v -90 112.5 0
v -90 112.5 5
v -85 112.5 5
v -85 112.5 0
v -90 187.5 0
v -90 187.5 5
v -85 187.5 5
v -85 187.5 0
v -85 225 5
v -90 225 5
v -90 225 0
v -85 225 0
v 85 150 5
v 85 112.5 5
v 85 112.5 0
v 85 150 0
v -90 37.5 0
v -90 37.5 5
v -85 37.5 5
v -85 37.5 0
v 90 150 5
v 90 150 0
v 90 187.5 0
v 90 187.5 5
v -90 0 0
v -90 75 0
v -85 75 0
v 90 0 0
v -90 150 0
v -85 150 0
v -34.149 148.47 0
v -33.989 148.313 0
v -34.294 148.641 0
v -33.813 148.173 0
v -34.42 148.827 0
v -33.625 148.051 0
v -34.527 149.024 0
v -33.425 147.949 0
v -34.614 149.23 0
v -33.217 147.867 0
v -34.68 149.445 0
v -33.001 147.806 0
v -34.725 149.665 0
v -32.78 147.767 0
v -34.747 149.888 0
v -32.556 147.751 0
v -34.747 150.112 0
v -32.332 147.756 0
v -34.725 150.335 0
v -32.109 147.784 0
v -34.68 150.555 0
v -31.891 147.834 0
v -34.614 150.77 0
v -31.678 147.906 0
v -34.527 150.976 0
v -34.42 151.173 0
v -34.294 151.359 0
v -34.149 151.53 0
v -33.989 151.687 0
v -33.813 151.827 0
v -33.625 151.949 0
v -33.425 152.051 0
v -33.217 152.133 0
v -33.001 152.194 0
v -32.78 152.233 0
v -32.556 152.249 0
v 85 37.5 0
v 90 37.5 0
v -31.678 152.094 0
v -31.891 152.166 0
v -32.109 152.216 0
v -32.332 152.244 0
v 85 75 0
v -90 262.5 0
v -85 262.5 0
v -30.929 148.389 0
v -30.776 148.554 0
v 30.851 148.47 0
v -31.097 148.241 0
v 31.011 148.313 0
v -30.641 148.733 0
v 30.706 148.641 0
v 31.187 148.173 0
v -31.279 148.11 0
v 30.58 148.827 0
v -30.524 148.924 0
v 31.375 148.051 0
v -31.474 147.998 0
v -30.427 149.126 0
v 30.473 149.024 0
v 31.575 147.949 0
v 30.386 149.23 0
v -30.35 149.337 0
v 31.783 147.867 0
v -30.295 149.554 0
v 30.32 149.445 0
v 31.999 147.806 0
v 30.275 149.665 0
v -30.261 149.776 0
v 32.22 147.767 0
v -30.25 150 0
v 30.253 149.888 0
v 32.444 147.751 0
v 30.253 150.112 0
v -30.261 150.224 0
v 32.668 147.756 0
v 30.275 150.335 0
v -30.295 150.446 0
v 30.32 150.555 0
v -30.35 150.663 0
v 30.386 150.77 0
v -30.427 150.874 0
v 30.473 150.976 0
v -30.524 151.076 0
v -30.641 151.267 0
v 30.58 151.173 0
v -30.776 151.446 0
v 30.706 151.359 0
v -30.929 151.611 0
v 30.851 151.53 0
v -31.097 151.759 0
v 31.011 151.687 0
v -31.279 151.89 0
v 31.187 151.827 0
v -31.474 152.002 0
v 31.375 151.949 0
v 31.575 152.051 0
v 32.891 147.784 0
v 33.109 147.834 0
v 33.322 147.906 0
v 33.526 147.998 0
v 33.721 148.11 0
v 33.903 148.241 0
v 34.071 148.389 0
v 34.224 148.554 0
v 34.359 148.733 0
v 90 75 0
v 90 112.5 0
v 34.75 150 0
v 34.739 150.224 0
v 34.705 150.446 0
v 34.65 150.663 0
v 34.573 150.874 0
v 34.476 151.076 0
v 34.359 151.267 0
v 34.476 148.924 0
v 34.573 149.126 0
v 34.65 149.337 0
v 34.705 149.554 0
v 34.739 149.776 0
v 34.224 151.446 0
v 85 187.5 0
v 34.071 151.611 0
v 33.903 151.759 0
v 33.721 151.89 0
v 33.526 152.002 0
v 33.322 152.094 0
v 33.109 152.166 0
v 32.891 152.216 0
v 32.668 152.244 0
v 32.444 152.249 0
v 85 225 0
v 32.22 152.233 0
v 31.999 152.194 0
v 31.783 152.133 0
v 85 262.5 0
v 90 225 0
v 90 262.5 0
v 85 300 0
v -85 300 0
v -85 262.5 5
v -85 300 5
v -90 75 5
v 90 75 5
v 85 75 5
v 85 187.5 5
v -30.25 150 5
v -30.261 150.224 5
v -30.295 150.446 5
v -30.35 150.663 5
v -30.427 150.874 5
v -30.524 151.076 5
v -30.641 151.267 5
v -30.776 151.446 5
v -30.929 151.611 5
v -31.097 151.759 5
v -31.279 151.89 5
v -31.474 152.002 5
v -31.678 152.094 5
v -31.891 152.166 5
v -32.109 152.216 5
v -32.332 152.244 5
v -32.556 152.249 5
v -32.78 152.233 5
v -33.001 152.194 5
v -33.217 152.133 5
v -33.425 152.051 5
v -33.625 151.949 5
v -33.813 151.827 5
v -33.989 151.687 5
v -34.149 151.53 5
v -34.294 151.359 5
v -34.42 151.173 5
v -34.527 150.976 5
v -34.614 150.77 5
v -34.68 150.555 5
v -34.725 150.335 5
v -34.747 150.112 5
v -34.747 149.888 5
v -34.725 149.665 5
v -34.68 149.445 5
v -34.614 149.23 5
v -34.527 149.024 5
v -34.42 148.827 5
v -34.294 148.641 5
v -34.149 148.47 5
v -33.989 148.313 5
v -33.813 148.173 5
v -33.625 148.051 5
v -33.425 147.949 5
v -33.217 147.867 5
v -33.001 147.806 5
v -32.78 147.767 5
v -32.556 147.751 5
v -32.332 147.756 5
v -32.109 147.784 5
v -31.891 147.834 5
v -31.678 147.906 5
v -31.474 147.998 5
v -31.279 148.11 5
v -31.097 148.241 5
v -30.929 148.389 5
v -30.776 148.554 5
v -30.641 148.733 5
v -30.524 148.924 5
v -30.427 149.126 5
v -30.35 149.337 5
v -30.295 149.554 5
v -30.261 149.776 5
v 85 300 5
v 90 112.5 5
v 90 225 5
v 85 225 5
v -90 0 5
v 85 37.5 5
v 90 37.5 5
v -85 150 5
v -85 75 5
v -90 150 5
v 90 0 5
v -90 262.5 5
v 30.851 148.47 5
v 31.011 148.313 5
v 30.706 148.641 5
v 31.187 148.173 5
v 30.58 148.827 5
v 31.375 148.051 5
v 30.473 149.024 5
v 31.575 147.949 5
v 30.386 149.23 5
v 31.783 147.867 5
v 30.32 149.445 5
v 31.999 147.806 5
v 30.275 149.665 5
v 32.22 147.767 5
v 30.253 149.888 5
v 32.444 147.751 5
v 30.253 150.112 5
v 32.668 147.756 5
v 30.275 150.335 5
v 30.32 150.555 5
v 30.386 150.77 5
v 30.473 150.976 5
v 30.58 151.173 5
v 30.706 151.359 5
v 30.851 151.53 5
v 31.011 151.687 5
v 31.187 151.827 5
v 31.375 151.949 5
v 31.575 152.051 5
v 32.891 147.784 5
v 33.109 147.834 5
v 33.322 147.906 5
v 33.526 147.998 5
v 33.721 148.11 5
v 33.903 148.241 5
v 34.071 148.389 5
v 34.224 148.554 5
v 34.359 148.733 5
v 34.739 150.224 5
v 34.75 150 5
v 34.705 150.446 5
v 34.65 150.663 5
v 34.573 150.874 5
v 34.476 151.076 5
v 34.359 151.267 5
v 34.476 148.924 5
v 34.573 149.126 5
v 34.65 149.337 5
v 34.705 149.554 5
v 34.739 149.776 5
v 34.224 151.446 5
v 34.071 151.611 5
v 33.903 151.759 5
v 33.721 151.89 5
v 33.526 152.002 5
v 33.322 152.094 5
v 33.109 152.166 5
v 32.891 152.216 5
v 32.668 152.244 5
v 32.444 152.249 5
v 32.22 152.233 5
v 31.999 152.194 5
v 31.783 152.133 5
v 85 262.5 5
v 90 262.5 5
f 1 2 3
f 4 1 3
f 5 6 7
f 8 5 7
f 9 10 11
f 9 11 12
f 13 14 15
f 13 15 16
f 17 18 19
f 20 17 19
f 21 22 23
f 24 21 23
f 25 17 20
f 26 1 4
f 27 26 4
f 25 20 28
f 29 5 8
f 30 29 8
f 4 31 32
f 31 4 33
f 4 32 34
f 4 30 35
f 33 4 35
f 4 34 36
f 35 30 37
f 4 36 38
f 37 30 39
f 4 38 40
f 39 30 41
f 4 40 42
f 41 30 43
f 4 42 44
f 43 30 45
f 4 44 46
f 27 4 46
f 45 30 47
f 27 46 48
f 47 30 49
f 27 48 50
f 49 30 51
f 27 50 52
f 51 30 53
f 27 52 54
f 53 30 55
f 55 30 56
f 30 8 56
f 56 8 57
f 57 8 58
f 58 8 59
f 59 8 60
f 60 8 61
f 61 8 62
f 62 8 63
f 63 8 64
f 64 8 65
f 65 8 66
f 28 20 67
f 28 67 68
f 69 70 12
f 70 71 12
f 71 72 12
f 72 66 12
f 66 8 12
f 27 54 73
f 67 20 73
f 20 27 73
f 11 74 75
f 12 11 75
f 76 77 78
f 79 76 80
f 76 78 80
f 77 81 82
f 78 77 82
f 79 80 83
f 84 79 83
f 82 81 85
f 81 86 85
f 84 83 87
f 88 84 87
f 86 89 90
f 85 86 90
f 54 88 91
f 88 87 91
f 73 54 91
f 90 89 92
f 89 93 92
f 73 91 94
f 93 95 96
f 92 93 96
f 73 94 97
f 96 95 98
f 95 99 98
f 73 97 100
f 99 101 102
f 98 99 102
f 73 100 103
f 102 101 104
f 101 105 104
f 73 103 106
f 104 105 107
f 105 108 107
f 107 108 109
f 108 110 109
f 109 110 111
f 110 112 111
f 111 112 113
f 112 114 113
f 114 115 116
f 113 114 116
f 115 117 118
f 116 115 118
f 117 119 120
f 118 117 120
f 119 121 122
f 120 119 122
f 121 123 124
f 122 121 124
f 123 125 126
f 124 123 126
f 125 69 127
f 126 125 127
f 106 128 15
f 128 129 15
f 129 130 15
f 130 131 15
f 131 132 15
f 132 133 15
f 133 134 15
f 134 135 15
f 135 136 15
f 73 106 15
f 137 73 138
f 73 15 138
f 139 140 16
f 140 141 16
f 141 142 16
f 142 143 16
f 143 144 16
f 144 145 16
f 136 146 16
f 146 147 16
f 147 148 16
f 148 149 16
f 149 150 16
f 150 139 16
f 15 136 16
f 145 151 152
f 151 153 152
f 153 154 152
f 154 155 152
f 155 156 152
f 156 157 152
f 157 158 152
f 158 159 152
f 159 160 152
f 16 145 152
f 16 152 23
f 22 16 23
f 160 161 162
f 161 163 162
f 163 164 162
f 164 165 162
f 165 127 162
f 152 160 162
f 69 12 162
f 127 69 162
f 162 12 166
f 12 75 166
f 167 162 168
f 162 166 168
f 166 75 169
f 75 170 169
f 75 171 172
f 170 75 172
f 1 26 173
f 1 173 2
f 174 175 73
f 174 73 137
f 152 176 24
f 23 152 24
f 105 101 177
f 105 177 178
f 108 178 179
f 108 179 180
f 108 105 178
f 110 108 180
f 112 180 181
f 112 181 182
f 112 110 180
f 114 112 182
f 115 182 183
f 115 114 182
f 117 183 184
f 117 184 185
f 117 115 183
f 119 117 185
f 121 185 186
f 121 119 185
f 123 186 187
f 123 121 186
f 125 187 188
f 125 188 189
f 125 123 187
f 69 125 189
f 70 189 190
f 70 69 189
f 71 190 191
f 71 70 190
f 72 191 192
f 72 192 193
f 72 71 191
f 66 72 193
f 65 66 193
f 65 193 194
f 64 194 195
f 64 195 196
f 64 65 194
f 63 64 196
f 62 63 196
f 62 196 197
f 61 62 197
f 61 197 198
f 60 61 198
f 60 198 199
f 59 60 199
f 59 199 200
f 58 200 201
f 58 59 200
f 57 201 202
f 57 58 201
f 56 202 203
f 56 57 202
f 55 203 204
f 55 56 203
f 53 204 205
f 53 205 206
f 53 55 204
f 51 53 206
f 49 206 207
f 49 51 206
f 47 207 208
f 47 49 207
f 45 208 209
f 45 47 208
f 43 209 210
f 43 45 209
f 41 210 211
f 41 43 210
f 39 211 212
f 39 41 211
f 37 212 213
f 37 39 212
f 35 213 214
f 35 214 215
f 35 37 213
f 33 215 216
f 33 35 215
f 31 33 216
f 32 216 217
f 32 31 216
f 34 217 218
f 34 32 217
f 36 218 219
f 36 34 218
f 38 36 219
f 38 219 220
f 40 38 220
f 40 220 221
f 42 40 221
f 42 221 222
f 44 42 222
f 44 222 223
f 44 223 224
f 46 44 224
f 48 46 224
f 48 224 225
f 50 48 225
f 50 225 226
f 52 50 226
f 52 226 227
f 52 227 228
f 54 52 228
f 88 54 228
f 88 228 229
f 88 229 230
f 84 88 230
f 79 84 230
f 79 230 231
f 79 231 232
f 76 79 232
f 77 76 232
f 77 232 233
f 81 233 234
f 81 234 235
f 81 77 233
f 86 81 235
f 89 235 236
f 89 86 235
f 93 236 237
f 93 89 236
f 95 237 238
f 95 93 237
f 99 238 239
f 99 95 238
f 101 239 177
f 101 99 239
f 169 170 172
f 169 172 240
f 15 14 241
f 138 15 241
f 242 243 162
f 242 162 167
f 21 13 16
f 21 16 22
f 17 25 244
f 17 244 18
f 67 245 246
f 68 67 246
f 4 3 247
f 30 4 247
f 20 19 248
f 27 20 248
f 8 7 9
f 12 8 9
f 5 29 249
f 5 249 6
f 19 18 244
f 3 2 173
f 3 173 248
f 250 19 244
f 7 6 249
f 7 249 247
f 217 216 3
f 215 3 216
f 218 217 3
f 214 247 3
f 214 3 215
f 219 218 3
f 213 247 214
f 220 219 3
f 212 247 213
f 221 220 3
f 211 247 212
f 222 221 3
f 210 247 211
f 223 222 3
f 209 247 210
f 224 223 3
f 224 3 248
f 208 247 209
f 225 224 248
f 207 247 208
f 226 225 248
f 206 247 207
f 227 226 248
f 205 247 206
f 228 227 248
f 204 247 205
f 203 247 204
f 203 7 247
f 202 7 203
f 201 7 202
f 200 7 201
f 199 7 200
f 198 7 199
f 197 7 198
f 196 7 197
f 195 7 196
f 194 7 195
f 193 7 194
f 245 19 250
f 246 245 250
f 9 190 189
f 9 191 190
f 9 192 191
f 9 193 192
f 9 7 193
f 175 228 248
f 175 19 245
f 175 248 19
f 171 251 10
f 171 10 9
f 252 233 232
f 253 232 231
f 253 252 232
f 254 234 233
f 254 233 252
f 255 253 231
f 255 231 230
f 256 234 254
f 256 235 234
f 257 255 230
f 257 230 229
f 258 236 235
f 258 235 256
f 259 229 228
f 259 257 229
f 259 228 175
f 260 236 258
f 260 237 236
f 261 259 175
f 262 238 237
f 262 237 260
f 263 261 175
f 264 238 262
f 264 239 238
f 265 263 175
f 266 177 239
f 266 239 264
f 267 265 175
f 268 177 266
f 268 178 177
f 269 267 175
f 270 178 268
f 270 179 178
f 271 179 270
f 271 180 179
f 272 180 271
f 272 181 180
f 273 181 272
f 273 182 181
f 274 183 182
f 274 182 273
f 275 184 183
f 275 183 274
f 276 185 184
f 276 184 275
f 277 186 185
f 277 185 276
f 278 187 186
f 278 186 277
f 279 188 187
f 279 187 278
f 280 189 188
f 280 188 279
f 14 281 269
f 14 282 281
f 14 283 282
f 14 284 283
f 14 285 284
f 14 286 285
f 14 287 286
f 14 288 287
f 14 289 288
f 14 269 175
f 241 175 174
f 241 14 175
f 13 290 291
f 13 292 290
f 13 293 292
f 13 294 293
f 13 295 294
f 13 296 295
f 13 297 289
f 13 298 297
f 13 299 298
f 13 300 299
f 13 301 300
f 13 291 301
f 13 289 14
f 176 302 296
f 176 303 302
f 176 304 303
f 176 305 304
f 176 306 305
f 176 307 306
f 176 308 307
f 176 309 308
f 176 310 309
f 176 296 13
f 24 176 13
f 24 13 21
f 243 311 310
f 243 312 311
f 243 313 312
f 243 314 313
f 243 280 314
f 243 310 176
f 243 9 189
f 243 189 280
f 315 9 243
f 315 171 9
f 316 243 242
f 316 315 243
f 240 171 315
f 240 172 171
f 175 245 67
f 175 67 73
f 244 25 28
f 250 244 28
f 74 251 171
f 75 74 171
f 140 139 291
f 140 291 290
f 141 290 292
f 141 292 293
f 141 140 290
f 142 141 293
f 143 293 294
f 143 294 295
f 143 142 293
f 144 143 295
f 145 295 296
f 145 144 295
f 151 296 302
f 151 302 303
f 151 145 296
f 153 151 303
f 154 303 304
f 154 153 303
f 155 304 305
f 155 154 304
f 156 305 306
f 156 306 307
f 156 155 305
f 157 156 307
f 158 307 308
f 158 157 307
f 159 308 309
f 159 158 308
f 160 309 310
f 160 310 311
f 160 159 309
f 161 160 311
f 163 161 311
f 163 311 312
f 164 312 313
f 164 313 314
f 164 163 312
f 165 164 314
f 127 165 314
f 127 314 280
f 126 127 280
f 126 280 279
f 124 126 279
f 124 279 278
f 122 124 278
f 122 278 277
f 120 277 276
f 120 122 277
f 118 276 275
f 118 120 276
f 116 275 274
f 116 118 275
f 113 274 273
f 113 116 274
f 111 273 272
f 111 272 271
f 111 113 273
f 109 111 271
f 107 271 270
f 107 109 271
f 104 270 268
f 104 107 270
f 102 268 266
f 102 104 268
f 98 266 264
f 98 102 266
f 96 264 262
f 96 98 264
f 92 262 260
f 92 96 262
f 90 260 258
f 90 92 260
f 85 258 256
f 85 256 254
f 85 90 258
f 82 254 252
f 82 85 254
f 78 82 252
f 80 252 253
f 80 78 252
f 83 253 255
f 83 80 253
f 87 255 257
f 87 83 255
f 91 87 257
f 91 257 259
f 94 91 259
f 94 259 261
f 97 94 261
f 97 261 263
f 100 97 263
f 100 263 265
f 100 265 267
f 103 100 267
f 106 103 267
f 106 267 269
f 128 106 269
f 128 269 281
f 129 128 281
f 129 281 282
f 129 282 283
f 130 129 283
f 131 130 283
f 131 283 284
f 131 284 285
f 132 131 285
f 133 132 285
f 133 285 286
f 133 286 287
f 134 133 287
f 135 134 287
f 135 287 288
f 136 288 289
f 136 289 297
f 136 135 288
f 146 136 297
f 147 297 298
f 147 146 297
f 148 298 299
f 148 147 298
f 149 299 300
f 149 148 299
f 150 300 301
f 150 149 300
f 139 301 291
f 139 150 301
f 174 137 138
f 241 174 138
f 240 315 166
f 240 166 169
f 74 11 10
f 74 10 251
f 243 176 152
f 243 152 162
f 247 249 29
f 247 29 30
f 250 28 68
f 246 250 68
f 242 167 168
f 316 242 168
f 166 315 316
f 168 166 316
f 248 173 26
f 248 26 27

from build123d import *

# Parameters (mm, degrees)
SKETCH1_W           = 180
SKETCH1_H           = 300
SKETCH1_R           = 2.25
BOSS_EXTRUDE1_DEPTH = 5
CUT_EXTRUDE1_REACH  = 315.249
SKETCH2_W           = 5
SKETCH2_H           = 37.5


with BuildPart() as part:
    # Sketch1 → Boss-Extrude1 (new body)
    with BuildSketch(Plane.XY):
        with Locations((0, 150)):
            Rectangle(SKETCH1_W, SKETCH1_H)
        with Locations((-32.5, 150)):
            Circle(SKETCH1_R, mode=Mode.SUBTRACT)
        with Locations((32.5, 150)):
            Circle(SKETCH1_R, mode=Mode.SUBTRACT)
    extrude(amount=BOSS_EXTRUDE1_DEPTH)

    # Sketch2 → Cut-Extrude1 (cut, up to next)
    with BuildSketch(Plane.XY.offset(5), mode=Mode.PRIVATE) as cut_extrude1_sk1:
        with Locations((-87.5, 281.25)):
            Rectangle(SKETCH2_W, SKETCH2_H)
    cut_extrude1_tool1 = extrude(cut_extrude1_sk1.sketch, amount=-CUT_EXTRUDE1_REACH, mode=Mode.PRIVATE) & part.part
    # Sketch2 → Cut-Extrude1 (cut, up to next)
    with BuildSketch(Plane.XY.offset(5), mode=Mode.PRIVATE) as cut_extrude1_sk2:
        with Locations((-87.5, 206.25)):
            Rectangle(SKETCH2_W, SKETCH2_H)
    cut_extrude1_tool2 = extrude(cut_extrude1_sk2.sketch, amount=-CUT_EXTRUDE1_REACH, mode=Mode.PRIVATE) & part.part
    # Sketch2 → Cut-Extrude1 (cut, up to next)
    with BuildSketch(Plane.XY.offset(5), mode=Mode.PRIVATE) as cut_extrude1_sk3:
        with Locations((-87.5, 131.25)):
            Rectangle(SKETCH2_W, SKETCH2_H)
    cut_extrude1_tool3 = extrude(cut_extrude1_sk3.sketch, amount=-CUT_EXTRUDE1_REACH, mode=Mode.PRIVATE) & part.part
    # Sketch2 → Cut-Extrude1 (cut, up to next)
    with BuildSketch(Plane.XY.offset(5), mode=Mode.PRIVATE) as cut_extrude1_sk4:
        with Locations((-87.5, 56.25)):
            Rectangle(SKETCH2_W, SKETCH2_H)
    cut_extrude1_tool4 = extrude(cut_extrude1_sk4.sketch, amount=-CUT_EXTRUDE1_REACH, mode=Mode.PRIVATE) & part.part
    # Sketch2 → Cut-Extrude1 (cut, up to next)
    with BuildSketch(Plane.XY.offset(5), mode=Mode.PRIVATE) as cut_extrude1_sk5:
        with Locations((87.5, 281.25)):
            Rectangle(SKETCH2_W, SKETCH2_H)
    cut_extrude1_tool5 = extrude(cut_extrude1_sk5.sketch, amount=-CUT_EXTRUDE1_REACH, mode=Mode.PRIVATE) & part.part
    # Sketch2 → Cut-Extrude1 (cut, up to next)
    with BuildSketch(Plane.XY.offset(5), mode=Mode.PRIVATE) as cut_extrude1_sk6:
        with Locations((87.5, 206.25)):
            Rectangle(SKETCH2_W, SKETCH2_H)
    cut_extrude1_tool6 = extrude(cut_extrude1_sk6.sketch, amount=-CUT_EXTRUDE1_REACH, mode=Mode.PRIVATE) & part.part
    # Sketch2 → Cut-Extrude1 (cut, up to next)
    with BuildSketch(Plane.XY.offset(5), mode=Mode.PRIVATE) as cut_extrude1_sk7:
        with Locations((87.5, 131.25)):
            Rectangle(SKETCH2_W, SKETCH2_H)
    cut_extrude1_tool7 = extrude(cut_extrude1_sk7.sketch, amount=-CUT_EXTRUDE1_REACH, mode=Mode.PRIVATE) & part.part
    # Sketch2 → Cut-Extrude1 (cut, up to next)
    with BuildSketch(Plane.XY.offset(5), mode=Mode.PRIVATE) as cut_extrude1_sk8:
        with Locations((87.5, 56.25)):
            Rectangle(SKETCH2_W, SKETCH2_H)
    cut_extrude1_tool8 = extrude(cut_extrude1_sk8.sketch, amount=-CUT_EXTRUDE1_REACH, mode=Mode.PRIVATE) & part.part
    add(cut_extrude1_tool1.solids().sort_by_distance((-87.5, 281.25, 5))[0], mode=Mode.SUBTRACT)
    add(cut_extrude1_tool2.solids().sort_by_distance((-87.5, 206.25, 5))[0], mode=Mode.SUBTRACT)
    add(cut_extrude1_tool3.solids().sort_by_distance((-87.5, 131.25, 5))[0], mode=Mode.SUBTRACT)
    add(cut_extrude1_tool4.solids().sort_by_distance((-87.5, 56.25, 5))[0], mode=Mode.SUBTRACT)
    add(cut_extrude1_tool5.solids().sort_by_distance((87.5, 281.25, 5))[0], mode=Mode.SUBTRACT)
    add(cut_extrude1_tool6.solids().sort_by_distance((87.5, 206.25, 5))[0], mode=Mode.SUBTRACT)
    add(cut_extrude1_tool7.solids().sort_by_distance((87.5, 131.25, 5))[0], mode=Mode.SUBTRACT)
    add(cut_extrude1_tool8.solids().sort_by_distance((87.5, 56.25, 5))[0], mode=Mode.SUBTRACT)


solid = part.part
